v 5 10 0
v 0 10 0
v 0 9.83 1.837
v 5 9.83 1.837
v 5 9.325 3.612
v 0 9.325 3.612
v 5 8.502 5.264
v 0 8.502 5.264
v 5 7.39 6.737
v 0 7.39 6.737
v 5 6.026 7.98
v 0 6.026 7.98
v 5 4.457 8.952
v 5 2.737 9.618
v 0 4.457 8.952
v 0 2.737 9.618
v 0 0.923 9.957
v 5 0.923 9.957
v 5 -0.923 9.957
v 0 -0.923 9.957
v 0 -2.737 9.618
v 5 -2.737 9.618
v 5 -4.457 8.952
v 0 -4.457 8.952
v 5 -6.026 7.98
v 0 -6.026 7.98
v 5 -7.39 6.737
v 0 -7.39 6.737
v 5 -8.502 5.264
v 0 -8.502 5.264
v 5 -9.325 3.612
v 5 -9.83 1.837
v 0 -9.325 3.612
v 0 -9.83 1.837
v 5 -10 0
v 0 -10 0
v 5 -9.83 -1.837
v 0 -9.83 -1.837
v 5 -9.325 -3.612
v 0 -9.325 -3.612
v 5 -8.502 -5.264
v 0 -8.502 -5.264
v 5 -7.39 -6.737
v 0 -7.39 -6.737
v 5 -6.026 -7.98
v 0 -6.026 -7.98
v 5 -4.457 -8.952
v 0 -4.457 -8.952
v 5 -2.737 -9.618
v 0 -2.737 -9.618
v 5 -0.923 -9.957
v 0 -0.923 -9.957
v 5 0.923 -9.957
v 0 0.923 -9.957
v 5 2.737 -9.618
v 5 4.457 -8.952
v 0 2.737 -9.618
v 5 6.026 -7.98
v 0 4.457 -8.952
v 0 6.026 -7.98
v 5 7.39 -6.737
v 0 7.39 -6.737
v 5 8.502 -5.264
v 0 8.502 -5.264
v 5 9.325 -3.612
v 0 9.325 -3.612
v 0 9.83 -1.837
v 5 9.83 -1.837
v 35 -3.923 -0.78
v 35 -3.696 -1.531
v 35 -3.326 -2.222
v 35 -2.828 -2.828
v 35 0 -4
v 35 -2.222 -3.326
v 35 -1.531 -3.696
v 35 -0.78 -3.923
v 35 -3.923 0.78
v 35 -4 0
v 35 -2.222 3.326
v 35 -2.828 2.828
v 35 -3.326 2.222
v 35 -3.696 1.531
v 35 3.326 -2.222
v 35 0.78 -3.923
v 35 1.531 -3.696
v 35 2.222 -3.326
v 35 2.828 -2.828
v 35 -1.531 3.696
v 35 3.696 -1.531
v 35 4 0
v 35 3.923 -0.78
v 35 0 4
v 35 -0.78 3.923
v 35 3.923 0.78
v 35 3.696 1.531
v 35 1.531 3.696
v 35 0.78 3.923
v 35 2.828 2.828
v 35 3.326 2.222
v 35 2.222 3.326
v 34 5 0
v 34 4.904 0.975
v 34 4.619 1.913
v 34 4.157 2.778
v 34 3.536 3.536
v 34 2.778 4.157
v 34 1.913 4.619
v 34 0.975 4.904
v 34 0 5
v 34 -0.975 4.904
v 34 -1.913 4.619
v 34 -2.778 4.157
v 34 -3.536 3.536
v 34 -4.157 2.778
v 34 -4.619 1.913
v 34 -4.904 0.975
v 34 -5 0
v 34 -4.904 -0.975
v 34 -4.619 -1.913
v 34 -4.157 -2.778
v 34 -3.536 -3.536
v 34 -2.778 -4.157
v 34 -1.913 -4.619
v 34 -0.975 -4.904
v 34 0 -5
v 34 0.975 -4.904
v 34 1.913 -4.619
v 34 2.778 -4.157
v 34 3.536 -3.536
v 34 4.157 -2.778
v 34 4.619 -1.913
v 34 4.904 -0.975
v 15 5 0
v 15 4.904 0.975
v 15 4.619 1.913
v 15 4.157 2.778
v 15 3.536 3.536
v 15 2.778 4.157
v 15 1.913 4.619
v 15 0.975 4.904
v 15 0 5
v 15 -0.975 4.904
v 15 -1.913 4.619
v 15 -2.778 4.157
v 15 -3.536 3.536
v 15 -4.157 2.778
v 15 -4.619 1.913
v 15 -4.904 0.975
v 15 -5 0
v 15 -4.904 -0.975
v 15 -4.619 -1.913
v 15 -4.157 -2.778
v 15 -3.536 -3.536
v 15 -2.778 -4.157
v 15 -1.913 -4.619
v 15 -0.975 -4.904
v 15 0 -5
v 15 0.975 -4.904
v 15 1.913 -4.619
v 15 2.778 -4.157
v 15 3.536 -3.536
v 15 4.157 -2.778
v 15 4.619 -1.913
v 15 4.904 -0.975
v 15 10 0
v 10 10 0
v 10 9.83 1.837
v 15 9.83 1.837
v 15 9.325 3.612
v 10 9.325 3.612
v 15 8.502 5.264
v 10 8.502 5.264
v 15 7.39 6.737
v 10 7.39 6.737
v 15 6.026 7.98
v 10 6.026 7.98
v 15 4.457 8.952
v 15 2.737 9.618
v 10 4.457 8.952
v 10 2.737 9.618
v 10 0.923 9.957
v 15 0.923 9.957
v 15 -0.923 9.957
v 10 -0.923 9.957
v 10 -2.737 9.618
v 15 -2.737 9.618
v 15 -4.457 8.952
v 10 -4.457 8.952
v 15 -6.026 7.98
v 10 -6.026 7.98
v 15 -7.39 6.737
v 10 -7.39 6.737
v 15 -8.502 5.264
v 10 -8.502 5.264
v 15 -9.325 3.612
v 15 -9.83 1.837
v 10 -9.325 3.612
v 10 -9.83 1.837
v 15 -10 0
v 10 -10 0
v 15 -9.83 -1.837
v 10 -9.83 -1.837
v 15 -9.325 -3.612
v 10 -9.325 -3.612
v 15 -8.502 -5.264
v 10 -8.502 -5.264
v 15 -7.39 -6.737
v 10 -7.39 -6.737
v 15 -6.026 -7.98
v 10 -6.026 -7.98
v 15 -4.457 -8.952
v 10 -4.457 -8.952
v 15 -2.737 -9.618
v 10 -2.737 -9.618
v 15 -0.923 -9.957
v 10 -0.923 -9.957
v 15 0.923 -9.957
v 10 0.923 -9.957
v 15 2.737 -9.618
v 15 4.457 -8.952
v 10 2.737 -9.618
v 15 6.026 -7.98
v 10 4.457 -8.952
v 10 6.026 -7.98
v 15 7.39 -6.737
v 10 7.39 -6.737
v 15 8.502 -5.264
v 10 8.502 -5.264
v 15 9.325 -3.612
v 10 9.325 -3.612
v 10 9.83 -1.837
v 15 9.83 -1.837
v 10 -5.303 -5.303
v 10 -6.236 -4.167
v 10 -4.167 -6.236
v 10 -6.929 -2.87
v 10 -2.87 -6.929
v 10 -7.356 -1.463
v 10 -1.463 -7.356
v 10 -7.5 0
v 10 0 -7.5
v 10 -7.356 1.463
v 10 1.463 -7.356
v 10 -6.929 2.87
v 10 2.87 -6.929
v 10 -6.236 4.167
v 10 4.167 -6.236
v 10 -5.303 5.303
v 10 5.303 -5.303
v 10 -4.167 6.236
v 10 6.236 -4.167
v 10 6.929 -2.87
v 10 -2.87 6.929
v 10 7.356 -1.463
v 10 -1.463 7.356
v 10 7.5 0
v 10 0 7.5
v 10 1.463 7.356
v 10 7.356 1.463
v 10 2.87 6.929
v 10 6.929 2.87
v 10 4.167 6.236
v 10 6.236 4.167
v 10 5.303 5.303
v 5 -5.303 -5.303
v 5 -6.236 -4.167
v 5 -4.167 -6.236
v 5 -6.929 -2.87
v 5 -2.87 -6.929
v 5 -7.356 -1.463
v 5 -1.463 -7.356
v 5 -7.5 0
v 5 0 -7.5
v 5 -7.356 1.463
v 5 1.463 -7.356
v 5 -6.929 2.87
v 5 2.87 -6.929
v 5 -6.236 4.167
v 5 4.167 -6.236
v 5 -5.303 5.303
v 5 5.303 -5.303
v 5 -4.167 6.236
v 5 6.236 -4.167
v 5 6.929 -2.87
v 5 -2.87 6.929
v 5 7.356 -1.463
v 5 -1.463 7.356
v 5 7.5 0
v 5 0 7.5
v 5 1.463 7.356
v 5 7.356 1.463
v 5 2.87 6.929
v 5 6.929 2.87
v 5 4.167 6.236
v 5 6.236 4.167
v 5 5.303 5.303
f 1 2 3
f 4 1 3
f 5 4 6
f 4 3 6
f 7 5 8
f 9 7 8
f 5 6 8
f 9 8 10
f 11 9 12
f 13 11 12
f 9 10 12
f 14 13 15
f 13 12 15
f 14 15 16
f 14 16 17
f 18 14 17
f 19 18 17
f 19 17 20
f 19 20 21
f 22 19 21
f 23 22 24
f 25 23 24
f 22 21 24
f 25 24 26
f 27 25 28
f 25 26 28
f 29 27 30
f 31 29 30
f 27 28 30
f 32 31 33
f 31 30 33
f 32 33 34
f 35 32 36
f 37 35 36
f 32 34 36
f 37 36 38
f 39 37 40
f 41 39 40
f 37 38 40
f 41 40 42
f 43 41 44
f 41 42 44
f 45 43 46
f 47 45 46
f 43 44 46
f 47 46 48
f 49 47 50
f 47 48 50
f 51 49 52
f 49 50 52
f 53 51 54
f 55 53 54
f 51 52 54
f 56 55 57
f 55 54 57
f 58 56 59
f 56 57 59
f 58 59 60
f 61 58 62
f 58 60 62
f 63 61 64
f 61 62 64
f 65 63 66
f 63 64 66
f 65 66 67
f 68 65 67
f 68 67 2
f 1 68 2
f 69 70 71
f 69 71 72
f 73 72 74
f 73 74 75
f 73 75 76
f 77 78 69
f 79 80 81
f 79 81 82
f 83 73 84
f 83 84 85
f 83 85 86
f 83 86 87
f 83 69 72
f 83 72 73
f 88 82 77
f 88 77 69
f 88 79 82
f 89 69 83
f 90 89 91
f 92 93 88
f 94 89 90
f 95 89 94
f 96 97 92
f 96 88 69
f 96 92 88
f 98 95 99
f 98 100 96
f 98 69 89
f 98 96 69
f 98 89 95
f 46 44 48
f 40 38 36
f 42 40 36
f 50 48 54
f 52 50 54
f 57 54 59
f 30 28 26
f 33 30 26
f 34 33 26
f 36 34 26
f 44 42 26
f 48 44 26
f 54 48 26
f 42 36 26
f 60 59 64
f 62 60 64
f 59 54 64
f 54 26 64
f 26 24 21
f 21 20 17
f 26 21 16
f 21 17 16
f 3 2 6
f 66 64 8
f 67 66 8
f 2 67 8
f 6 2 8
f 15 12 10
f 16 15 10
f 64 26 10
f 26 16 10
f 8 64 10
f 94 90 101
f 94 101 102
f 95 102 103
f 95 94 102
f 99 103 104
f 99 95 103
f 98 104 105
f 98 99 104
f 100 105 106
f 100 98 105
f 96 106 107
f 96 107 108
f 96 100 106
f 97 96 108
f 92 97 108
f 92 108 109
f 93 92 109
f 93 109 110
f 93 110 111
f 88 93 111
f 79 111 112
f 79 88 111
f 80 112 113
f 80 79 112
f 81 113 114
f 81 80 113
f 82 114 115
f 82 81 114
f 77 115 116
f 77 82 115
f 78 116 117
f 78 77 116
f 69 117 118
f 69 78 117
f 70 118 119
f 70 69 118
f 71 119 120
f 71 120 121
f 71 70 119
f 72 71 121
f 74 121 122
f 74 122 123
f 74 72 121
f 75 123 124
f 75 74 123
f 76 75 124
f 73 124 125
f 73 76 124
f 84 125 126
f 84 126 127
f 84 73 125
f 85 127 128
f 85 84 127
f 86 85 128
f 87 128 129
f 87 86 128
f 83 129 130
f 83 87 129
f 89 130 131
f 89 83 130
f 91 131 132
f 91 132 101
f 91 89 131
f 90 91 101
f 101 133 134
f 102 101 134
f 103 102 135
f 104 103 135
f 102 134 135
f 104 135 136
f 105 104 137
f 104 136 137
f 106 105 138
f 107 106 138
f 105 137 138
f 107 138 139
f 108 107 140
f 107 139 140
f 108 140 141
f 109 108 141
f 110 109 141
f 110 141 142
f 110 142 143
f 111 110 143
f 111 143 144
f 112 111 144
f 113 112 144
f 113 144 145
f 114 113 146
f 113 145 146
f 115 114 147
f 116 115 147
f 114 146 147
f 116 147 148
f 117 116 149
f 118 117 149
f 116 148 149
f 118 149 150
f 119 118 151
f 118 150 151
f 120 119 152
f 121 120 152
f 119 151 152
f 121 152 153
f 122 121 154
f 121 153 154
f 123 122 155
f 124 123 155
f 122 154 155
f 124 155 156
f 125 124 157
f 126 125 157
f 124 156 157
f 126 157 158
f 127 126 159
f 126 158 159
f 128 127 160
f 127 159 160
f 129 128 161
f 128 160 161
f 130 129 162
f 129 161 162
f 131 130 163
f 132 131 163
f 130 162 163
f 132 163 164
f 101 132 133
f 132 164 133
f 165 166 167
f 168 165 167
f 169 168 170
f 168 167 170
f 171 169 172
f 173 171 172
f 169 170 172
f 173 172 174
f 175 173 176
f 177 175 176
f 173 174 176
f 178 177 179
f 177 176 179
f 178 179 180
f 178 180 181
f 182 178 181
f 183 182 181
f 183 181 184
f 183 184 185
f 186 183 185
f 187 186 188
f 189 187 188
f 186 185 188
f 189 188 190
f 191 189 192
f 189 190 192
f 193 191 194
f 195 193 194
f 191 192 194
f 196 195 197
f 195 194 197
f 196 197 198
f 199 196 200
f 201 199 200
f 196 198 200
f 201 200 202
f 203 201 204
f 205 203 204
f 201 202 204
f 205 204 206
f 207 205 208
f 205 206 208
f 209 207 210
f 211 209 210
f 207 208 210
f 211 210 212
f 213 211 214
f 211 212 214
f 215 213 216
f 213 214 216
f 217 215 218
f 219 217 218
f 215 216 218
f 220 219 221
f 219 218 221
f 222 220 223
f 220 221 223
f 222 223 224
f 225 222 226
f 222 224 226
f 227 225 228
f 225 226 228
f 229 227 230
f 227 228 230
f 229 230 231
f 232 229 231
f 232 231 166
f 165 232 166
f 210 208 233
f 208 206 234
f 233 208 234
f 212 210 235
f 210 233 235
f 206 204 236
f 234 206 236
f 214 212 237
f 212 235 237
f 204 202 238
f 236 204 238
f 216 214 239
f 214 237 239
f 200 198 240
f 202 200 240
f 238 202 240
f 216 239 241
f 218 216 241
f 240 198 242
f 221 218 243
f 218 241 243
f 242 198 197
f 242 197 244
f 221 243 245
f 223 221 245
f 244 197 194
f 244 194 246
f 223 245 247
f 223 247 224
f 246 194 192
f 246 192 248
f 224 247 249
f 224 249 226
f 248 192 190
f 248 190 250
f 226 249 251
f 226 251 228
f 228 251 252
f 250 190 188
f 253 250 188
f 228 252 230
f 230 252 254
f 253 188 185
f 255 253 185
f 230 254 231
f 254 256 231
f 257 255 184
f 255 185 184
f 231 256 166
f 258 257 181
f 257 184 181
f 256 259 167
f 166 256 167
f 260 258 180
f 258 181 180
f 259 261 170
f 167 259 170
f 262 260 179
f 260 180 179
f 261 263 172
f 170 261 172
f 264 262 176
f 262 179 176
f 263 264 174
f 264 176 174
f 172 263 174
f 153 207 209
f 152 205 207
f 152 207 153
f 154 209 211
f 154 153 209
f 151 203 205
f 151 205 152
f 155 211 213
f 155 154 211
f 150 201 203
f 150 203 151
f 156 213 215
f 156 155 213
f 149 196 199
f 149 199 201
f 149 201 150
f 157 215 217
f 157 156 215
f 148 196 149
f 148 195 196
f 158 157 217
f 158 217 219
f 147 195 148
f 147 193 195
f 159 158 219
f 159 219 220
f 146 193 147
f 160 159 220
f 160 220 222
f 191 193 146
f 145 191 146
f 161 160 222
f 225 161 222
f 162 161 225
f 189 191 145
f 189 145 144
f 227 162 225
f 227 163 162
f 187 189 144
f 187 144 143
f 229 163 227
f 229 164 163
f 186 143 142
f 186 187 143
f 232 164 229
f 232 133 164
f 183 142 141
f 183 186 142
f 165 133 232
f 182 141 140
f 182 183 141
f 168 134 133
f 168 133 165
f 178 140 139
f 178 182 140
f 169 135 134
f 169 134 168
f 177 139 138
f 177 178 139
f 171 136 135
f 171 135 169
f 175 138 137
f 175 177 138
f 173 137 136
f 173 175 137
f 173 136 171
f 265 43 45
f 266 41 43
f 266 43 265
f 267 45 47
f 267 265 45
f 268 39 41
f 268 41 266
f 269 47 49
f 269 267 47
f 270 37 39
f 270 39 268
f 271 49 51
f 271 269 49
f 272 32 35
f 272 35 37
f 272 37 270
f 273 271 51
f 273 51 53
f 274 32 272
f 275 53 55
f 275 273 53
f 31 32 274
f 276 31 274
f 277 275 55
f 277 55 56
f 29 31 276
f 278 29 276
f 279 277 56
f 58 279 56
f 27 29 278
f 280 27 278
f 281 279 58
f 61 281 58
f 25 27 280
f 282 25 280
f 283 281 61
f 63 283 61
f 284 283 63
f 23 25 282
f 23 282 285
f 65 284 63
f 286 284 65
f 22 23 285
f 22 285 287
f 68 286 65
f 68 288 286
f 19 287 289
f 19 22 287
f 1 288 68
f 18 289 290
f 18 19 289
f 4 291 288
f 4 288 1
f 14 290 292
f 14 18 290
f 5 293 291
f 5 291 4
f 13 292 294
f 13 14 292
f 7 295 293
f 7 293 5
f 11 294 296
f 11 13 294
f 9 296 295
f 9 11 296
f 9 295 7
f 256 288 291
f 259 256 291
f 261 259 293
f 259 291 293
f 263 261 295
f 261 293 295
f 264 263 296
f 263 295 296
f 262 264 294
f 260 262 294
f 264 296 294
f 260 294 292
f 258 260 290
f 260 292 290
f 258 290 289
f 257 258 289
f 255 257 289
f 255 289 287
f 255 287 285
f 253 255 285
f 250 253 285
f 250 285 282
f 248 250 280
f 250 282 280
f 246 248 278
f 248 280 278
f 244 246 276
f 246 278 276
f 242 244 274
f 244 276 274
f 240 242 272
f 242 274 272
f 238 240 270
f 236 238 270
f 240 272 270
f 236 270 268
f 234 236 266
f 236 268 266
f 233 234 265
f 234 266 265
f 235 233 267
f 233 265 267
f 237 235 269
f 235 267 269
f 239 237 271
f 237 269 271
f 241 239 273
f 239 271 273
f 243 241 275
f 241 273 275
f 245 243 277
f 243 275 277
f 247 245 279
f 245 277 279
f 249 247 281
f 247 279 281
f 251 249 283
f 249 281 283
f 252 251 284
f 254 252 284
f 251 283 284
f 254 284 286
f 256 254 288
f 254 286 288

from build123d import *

# Parameters (mm, degrees)
F0_R     = 10
F1_DEPTH = 5
F2_R     = 7.5
F3_DEPTH = 5
F4_R     = 10
F5_DEPTH = 5
F6_R     = 5
F7_DEPTH = 20
F8_SIZE  = 1


with BuildPart() as f1:
    # F0 (on Right) → F1 (new body)
    with BuildSketch(Plane.YZ):
        Circle(F0_R)
    extrude(amount=F1_DEPTH)

    # F2 (on face) → F3 (join)
    with BuildSketch(Plane.YZ.offset(5)):
        Circle(F2_R)
    extrude(amount=F3_DEPTH)

    # F4 (on face) → F5 (join)
    with BuildSketch(Plane.YZ.offset(10)):
        Circle(F4_R)
    extrude(amount=F5_DEPTH)

    # F6 (on face) → F7 (join)
    with BuildSketch(Plane.YZ.offset(15)):
        Circle(F6_R)
    extrude(amount=F7_DEPTH)

    # F8
    f8_edges = [f1.edges().sort_by_distance(p)[0] for p in [
        (35, -5, 0),
    ]]
    chamfer(f8_edges, length=F8_SIZE)


solid = f1.part
